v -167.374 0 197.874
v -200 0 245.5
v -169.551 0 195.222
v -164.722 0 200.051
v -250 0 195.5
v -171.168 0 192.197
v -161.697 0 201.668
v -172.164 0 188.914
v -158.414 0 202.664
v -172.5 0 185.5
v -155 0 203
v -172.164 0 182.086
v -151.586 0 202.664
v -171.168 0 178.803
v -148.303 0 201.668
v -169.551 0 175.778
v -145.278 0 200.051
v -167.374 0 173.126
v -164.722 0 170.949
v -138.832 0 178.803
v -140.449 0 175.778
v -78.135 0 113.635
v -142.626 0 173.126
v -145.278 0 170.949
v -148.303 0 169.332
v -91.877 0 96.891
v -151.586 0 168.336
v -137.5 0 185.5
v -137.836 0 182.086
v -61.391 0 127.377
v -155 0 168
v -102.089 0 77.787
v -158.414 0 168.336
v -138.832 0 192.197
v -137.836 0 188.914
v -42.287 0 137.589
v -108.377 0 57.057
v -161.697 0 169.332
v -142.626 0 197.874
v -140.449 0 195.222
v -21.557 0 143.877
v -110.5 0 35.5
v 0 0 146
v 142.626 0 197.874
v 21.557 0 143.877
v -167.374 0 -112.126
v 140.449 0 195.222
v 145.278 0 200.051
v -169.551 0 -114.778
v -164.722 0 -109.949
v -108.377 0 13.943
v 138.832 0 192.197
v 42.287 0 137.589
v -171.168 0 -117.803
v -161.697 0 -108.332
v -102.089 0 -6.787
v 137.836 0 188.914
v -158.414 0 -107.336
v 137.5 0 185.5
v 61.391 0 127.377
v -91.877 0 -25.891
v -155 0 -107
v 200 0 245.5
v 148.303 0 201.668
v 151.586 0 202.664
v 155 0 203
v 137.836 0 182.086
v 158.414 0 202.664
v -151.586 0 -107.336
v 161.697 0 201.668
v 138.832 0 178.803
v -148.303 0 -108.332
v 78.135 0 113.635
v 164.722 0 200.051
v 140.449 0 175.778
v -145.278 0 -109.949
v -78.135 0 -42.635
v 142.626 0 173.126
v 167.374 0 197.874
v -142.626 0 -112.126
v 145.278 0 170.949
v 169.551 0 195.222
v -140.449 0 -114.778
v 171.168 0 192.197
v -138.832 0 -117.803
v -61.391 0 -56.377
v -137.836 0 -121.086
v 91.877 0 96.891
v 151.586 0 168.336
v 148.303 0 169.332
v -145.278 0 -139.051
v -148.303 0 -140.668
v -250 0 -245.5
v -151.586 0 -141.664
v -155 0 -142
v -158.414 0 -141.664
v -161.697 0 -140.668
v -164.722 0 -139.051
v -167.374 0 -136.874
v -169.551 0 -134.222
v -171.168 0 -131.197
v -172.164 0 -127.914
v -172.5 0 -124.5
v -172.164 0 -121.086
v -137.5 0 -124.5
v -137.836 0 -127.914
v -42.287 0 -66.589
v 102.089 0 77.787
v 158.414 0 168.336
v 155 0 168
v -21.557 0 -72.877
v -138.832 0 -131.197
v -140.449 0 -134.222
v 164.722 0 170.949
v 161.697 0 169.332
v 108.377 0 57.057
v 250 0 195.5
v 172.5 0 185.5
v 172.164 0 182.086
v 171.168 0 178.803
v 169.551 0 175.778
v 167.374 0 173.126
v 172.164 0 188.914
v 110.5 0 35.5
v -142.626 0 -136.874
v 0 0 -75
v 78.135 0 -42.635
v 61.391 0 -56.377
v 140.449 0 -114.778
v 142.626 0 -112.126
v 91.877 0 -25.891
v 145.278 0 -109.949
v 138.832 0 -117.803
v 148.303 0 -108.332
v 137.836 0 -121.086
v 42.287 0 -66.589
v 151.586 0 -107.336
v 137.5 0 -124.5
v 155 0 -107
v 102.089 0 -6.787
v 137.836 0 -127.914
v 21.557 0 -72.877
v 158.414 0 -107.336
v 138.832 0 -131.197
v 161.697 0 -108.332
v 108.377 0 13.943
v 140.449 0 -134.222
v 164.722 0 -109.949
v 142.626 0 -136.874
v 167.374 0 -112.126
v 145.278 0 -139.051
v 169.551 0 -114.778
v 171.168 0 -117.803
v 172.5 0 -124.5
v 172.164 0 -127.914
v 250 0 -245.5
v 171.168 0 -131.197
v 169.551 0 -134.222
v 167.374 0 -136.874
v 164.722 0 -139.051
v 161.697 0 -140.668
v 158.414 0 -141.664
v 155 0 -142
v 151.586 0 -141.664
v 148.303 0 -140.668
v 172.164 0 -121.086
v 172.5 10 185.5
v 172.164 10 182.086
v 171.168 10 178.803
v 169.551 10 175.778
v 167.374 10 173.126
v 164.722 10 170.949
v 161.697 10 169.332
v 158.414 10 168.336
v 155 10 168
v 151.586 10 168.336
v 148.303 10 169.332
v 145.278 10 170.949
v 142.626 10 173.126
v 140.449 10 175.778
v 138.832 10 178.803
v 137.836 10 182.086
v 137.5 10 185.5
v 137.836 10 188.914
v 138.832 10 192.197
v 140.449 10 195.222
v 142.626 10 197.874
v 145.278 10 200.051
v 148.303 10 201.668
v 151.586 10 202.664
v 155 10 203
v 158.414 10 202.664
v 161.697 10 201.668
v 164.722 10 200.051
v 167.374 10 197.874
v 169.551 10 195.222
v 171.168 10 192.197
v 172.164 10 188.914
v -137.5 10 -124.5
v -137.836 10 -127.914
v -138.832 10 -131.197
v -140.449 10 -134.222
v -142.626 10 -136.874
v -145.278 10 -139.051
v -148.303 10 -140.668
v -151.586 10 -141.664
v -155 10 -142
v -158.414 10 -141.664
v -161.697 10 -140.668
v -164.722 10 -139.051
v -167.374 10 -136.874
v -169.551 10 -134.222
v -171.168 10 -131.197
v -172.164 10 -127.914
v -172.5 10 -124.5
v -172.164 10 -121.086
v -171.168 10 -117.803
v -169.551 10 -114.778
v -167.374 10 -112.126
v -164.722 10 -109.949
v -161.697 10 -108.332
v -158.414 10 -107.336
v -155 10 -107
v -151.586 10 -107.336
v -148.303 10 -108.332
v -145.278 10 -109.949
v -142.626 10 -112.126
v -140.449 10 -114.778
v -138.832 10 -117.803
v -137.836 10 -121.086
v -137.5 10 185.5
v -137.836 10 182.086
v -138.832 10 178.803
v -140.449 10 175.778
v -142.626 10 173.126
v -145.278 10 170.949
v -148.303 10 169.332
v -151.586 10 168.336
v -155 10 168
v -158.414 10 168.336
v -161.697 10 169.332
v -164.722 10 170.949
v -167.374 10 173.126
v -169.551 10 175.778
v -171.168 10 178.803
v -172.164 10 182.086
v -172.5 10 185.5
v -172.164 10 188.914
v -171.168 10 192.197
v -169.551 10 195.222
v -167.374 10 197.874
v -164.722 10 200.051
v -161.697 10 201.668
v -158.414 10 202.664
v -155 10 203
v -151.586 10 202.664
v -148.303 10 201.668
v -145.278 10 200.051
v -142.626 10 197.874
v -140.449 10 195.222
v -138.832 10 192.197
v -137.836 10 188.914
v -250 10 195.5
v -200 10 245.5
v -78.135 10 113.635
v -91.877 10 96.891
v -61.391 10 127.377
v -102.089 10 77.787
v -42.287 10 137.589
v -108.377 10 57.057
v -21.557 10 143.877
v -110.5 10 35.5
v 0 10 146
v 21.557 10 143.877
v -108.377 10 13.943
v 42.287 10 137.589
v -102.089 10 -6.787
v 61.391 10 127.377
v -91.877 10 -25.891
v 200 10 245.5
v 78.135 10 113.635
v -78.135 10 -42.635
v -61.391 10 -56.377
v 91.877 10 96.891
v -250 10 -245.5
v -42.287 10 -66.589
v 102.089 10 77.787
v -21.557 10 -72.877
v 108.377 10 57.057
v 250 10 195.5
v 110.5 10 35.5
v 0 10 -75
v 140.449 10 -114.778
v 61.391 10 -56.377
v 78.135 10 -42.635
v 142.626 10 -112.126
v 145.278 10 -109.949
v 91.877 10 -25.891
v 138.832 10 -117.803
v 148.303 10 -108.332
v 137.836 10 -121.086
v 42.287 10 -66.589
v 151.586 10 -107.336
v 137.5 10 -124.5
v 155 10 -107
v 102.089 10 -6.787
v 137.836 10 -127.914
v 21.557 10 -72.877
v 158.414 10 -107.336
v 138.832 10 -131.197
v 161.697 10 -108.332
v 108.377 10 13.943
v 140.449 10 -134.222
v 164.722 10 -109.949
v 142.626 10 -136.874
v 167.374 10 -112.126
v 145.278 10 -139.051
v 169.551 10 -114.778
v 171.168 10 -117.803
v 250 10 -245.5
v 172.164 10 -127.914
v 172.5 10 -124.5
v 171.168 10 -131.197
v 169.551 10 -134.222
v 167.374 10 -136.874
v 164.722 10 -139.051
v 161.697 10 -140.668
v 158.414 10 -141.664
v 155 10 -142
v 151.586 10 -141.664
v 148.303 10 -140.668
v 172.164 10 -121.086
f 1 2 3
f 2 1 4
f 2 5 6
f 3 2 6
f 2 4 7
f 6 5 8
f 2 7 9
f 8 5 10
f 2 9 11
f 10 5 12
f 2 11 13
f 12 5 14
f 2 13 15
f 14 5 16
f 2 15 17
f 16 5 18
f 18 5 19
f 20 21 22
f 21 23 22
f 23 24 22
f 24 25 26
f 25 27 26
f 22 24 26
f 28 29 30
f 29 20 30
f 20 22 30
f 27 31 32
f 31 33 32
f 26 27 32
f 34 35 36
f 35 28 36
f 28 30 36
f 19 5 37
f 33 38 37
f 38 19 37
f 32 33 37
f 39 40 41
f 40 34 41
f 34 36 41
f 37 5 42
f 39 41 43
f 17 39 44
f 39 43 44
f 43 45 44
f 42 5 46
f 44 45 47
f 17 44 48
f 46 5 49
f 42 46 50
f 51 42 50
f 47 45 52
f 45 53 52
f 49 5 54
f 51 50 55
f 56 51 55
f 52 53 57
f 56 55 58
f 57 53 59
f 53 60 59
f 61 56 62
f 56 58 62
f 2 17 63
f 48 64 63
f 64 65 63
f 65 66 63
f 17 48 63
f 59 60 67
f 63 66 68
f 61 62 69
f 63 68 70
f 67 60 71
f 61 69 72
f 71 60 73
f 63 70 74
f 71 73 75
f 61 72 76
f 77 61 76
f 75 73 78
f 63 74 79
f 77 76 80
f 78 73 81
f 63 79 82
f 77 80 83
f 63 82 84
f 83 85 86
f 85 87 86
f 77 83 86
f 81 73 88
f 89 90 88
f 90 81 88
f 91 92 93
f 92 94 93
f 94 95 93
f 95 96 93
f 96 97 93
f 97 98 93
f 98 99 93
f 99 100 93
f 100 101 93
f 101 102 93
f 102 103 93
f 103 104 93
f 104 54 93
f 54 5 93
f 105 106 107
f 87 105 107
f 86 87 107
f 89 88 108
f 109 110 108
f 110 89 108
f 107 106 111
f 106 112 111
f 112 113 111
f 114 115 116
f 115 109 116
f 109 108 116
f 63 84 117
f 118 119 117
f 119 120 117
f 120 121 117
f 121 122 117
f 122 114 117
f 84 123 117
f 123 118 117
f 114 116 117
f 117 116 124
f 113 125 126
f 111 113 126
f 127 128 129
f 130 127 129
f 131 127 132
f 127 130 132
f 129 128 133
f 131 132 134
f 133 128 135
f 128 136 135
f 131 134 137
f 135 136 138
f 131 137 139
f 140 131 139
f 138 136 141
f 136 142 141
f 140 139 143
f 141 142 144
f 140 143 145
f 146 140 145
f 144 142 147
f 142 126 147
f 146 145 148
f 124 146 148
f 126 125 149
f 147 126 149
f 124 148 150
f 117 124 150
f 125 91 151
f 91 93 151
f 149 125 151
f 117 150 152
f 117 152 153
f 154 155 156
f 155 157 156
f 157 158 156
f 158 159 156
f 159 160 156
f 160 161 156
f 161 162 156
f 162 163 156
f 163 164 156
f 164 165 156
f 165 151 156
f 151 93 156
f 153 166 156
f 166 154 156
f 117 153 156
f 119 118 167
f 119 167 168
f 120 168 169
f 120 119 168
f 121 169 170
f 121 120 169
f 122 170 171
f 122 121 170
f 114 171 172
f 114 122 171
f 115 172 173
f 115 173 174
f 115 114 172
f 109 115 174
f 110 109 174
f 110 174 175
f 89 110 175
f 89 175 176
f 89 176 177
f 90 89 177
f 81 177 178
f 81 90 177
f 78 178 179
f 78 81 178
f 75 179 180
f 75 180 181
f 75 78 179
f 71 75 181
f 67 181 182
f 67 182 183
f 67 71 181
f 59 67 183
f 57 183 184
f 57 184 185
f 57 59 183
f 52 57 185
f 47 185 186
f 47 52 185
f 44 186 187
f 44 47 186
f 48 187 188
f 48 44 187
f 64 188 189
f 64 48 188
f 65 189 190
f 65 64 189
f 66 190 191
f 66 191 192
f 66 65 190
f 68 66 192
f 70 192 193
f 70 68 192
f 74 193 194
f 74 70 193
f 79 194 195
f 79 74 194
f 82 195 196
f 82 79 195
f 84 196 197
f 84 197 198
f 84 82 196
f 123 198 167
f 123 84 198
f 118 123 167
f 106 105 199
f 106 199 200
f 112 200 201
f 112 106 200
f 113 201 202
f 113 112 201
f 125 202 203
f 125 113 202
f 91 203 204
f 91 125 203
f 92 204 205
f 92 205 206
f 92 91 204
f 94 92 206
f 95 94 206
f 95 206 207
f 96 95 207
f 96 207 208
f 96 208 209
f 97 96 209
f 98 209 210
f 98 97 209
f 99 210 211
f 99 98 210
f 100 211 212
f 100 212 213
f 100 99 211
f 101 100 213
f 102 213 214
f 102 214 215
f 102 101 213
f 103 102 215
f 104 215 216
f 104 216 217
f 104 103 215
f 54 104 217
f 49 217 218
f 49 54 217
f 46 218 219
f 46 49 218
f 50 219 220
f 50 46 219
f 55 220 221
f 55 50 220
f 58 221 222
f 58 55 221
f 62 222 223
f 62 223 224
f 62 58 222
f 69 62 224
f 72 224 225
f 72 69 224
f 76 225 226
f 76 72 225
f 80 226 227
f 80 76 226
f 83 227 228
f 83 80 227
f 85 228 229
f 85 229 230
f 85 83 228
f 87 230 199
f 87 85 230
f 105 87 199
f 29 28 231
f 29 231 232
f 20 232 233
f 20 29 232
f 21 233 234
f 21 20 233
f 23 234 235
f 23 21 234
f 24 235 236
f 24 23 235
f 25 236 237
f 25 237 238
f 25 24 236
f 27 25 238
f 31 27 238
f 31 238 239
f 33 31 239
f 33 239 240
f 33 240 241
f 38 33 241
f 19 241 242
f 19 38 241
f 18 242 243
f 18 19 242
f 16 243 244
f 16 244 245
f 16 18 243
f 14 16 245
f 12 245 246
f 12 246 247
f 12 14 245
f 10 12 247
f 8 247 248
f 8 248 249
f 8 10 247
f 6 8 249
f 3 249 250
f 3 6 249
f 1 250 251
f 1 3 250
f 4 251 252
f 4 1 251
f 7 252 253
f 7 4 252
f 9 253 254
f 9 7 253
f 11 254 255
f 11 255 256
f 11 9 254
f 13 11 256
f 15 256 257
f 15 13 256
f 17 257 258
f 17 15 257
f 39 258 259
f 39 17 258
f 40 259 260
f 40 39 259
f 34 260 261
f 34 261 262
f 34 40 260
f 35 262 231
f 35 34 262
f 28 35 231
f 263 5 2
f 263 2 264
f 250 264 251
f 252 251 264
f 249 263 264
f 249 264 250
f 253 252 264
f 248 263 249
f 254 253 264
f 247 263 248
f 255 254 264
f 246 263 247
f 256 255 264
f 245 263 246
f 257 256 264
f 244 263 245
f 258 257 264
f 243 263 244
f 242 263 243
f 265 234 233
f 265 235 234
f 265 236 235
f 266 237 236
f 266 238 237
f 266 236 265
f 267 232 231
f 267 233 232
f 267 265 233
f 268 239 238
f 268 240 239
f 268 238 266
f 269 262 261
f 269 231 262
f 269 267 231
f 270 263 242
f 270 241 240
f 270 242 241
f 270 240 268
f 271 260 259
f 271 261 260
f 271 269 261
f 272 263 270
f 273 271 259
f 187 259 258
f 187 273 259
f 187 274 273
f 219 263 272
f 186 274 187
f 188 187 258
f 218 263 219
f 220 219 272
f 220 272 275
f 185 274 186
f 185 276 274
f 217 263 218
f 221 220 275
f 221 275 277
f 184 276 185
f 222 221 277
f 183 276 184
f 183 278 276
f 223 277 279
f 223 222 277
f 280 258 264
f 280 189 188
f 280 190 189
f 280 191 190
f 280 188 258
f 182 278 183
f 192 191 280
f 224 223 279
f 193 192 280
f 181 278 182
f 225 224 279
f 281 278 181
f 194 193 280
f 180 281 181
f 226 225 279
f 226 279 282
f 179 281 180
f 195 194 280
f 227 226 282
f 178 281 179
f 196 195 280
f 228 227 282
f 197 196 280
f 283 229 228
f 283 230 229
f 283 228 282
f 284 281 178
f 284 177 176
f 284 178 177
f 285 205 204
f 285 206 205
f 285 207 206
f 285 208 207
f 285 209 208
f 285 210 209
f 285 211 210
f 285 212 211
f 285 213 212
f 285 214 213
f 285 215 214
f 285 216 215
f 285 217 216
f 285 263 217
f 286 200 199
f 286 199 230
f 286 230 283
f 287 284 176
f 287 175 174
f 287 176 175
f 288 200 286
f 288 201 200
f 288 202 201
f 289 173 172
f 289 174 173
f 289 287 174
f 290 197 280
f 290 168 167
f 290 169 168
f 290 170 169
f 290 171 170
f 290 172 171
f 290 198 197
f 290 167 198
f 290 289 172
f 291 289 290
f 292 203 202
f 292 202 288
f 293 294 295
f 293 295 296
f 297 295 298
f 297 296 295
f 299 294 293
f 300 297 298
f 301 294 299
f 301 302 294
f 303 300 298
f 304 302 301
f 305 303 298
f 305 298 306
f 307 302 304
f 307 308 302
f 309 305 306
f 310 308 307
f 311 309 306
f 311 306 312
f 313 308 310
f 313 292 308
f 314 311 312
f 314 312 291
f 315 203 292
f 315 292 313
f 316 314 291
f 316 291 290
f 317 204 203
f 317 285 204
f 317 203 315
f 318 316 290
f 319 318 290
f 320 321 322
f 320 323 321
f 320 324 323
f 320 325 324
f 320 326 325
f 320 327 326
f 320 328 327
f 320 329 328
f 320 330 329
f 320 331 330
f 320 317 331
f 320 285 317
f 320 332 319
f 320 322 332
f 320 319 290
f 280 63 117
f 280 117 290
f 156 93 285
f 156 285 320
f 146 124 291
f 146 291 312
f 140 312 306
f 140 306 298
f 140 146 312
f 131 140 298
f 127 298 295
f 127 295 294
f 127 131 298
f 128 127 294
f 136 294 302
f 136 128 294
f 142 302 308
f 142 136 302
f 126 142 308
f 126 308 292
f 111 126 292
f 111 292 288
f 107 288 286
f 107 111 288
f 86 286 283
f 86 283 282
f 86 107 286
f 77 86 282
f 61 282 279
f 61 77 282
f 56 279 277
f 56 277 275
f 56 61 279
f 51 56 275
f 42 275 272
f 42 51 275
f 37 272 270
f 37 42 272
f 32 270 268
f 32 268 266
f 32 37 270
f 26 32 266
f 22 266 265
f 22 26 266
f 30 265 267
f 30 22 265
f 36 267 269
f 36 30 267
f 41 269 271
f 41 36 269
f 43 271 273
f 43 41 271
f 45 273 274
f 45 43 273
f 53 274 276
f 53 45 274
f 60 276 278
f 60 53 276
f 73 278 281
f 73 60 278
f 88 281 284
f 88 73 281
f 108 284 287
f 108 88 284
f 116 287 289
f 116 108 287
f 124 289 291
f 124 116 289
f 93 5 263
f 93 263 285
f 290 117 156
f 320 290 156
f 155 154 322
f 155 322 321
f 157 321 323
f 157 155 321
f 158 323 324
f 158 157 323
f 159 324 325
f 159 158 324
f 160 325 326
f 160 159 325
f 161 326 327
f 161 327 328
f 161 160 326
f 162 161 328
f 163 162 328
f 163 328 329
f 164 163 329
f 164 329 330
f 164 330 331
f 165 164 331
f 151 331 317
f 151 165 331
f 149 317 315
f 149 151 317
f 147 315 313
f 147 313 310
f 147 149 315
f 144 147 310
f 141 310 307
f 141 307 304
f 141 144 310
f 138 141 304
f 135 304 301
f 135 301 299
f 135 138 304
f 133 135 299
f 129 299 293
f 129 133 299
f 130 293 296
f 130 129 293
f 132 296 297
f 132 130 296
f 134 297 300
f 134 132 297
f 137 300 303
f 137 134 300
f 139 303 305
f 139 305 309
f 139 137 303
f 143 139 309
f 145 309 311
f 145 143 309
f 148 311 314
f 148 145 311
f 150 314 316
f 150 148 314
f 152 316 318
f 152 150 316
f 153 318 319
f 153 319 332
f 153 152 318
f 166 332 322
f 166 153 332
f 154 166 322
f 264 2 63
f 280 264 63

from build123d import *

# Parameters (mm, degrees)
SKETCH1_W           = 500
SKETCH1_H           = 491
SKETCH1_R           = 110.5
SKETCH1_R_2         = 17.5
BOSS_EXTRUDE1_DEPTH = 10
CHAMFER1_SIZE       = 50


with BuildPart() as part:
    # Sketch1 → Boss-Extrude1 (new body)
    with BuildSketch(Plane(origin=(0, 0, 0), x_dir=(1, 0, 0), z_dir=(0, 1, 0))):
        Rectangle(SKETCH1_W, SKETCH1_H)
        with Locations((0, -35.5)):
            Circle(SKETCH1_R, mode=Mode.SUBTRACT)
        with Locations((-155, 124.5)):
            Circle(SKETCH1_R_2, mode=Mode.SUBTRACT)
        with Locations((155, 124.5)):
            Circle(SKETCH1_R_2, mode=Mode.SUBTRACT)
        with Locations((-155, -185.5)):
            Circle(SKETCH1_R_2, mode=Mode.SUBTRACT)
        with Locations((155, -185.5)):
            Circle(SKETCH1_R_2, mode=Mode.SUBTRACT)
    extrude(amount=BOSS_EXTRUDE1_DEPTH)

    # Chamfer1
    chamfer1_edges = [part.edges().sort_by_distance(p)[0] for p in [
        (250, 5, 245.5),
        (-250, 5, 245.5),
    ]]
    chamfer(chamfer1_edges, length=CHAMFER1_SIZE)


solid = part.part
